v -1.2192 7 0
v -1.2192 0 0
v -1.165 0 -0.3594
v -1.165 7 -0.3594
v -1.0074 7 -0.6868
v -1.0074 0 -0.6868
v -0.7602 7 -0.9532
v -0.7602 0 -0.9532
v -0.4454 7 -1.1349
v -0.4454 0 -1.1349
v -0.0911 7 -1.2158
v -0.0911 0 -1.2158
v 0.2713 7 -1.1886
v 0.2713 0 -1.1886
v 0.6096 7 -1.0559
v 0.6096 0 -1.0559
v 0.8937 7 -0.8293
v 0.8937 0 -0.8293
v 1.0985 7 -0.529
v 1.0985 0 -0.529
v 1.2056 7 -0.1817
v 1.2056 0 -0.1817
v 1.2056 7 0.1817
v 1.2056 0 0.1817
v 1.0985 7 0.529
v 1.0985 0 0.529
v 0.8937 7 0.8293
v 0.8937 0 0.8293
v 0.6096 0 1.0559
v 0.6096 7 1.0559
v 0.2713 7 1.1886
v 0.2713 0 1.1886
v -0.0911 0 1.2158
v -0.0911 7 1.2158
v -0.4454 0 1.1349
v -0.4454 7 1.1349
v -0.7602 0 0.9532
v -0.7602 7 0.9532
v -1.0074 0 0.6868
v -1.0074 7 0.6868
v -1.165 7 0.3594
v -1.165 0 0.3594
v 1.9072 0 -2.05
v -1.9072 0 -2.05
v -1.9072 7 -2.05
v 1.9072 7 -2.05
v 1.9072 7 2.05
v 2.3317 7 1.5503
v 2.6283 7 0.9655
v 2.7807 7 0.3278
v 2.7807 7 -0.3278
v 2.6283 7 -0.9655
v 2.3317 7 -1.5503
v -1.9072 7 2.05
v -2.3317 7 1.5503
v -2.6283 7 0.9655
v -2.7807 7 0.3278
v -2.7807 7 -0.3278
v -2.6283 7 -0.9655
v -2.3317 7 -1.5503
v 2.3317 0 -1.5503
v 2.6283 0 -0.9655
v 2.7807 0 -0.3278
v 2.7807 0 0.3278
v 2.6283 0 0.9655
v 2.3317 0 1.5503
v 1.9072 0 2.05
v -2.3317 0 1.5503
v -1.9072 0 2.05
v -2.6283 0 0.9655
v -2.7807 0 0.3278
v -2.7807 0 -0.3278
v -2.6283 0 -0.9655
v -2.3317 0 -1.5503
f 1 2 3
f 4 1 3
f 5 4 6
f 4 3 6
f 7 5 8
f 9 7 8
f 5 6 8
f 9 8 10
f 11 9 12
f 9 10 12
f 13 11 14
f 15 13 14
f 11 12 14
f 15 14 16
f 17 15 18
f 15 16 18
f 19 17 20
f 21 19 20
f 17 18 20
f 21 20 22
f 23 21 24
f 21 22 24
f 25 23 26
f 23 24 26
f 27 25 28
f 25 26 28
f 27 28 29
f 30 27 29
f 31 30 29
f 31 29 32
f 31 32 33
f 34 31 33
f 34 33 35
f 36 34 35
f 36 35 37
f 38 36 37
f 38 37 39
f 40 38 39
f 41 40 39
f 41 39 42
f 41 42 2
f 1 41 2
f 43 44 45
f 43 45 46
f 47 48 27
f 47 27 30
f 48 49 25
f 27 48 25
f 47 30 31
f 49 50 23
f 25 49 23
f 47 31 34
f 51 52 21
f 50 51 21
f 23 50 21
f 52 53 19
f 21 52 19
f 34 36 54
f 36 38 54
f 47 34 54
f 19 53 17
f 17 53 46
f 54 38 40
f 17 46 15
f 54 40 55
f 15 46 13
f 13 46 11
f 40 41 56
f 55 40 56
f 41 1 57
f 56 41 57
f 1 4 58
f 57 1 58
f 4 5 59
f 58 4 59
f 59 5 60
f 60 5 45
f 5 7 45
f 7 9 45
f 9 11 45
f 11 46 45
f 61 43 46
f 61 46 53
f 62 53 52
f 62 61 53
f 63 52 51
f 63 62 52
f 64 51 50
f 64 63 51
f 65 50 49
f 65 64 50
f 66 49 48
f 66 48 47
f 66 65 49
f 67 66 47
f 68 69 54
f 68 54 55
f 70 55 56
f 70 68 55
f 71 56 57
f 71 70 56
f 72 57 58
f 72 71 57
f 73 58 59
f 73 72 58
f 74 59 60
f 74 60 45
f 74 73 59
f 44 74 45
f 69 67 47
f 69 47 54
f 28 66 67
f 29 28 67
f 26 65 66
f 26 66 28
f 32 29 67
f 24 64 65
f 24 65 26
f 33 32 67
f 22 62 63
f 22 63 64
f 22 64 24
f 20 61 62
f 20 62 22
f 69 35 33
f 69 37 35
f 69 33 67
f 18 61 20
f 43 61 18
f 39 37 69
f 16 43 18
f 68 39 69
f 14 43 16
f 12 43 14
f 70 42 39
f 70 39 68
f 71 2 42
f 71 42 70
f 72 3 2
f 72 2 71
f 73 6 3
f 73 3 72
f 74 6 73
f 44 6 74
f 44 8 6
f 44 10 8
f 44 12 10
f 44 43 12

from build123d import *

# Parameters (mm, degrees)
BOSS_EXTRUDE1_DEPTH   = 7
F_2_CLEARANCE_HOLE1_D = 2.4384


with BuildPart() as part:
    # Sketch1 → Boss-Extrude1 (new body)
    with BuildSketch(Plane(origin=(0, 0, 0), x_dir=(1, 0, 0), z_dir=(0, 1, 0))):
        with BuildLine():
            Line((-1.907223112, 2.05), (1.907223112, 2.05))
            ThreePointArc((1.907223112, 2.05), (2.8, 0), (1.907223112, -2.05))
            Line((1.907223112, -2.05), (-1.907223112, -2.05))
            ThreePointArc((-1.907223112, -2.05), (-2.8, 0), (-1.907223112, 2.05))
        make_face()
    extrude(amount=BOSS_EXTRUDE1_DEPTH)

    # #2 Clearance Hole1 (through all)
    with Locations(Plane(origin=(0, 7, 0), x_dir=(1, 0, 0), z_dir=(0, 1, 0))):
        with Locations((0, 0)):
            Hole(F_2_CLEARANCE_HOLE1_D / 2)


solid = part.part
